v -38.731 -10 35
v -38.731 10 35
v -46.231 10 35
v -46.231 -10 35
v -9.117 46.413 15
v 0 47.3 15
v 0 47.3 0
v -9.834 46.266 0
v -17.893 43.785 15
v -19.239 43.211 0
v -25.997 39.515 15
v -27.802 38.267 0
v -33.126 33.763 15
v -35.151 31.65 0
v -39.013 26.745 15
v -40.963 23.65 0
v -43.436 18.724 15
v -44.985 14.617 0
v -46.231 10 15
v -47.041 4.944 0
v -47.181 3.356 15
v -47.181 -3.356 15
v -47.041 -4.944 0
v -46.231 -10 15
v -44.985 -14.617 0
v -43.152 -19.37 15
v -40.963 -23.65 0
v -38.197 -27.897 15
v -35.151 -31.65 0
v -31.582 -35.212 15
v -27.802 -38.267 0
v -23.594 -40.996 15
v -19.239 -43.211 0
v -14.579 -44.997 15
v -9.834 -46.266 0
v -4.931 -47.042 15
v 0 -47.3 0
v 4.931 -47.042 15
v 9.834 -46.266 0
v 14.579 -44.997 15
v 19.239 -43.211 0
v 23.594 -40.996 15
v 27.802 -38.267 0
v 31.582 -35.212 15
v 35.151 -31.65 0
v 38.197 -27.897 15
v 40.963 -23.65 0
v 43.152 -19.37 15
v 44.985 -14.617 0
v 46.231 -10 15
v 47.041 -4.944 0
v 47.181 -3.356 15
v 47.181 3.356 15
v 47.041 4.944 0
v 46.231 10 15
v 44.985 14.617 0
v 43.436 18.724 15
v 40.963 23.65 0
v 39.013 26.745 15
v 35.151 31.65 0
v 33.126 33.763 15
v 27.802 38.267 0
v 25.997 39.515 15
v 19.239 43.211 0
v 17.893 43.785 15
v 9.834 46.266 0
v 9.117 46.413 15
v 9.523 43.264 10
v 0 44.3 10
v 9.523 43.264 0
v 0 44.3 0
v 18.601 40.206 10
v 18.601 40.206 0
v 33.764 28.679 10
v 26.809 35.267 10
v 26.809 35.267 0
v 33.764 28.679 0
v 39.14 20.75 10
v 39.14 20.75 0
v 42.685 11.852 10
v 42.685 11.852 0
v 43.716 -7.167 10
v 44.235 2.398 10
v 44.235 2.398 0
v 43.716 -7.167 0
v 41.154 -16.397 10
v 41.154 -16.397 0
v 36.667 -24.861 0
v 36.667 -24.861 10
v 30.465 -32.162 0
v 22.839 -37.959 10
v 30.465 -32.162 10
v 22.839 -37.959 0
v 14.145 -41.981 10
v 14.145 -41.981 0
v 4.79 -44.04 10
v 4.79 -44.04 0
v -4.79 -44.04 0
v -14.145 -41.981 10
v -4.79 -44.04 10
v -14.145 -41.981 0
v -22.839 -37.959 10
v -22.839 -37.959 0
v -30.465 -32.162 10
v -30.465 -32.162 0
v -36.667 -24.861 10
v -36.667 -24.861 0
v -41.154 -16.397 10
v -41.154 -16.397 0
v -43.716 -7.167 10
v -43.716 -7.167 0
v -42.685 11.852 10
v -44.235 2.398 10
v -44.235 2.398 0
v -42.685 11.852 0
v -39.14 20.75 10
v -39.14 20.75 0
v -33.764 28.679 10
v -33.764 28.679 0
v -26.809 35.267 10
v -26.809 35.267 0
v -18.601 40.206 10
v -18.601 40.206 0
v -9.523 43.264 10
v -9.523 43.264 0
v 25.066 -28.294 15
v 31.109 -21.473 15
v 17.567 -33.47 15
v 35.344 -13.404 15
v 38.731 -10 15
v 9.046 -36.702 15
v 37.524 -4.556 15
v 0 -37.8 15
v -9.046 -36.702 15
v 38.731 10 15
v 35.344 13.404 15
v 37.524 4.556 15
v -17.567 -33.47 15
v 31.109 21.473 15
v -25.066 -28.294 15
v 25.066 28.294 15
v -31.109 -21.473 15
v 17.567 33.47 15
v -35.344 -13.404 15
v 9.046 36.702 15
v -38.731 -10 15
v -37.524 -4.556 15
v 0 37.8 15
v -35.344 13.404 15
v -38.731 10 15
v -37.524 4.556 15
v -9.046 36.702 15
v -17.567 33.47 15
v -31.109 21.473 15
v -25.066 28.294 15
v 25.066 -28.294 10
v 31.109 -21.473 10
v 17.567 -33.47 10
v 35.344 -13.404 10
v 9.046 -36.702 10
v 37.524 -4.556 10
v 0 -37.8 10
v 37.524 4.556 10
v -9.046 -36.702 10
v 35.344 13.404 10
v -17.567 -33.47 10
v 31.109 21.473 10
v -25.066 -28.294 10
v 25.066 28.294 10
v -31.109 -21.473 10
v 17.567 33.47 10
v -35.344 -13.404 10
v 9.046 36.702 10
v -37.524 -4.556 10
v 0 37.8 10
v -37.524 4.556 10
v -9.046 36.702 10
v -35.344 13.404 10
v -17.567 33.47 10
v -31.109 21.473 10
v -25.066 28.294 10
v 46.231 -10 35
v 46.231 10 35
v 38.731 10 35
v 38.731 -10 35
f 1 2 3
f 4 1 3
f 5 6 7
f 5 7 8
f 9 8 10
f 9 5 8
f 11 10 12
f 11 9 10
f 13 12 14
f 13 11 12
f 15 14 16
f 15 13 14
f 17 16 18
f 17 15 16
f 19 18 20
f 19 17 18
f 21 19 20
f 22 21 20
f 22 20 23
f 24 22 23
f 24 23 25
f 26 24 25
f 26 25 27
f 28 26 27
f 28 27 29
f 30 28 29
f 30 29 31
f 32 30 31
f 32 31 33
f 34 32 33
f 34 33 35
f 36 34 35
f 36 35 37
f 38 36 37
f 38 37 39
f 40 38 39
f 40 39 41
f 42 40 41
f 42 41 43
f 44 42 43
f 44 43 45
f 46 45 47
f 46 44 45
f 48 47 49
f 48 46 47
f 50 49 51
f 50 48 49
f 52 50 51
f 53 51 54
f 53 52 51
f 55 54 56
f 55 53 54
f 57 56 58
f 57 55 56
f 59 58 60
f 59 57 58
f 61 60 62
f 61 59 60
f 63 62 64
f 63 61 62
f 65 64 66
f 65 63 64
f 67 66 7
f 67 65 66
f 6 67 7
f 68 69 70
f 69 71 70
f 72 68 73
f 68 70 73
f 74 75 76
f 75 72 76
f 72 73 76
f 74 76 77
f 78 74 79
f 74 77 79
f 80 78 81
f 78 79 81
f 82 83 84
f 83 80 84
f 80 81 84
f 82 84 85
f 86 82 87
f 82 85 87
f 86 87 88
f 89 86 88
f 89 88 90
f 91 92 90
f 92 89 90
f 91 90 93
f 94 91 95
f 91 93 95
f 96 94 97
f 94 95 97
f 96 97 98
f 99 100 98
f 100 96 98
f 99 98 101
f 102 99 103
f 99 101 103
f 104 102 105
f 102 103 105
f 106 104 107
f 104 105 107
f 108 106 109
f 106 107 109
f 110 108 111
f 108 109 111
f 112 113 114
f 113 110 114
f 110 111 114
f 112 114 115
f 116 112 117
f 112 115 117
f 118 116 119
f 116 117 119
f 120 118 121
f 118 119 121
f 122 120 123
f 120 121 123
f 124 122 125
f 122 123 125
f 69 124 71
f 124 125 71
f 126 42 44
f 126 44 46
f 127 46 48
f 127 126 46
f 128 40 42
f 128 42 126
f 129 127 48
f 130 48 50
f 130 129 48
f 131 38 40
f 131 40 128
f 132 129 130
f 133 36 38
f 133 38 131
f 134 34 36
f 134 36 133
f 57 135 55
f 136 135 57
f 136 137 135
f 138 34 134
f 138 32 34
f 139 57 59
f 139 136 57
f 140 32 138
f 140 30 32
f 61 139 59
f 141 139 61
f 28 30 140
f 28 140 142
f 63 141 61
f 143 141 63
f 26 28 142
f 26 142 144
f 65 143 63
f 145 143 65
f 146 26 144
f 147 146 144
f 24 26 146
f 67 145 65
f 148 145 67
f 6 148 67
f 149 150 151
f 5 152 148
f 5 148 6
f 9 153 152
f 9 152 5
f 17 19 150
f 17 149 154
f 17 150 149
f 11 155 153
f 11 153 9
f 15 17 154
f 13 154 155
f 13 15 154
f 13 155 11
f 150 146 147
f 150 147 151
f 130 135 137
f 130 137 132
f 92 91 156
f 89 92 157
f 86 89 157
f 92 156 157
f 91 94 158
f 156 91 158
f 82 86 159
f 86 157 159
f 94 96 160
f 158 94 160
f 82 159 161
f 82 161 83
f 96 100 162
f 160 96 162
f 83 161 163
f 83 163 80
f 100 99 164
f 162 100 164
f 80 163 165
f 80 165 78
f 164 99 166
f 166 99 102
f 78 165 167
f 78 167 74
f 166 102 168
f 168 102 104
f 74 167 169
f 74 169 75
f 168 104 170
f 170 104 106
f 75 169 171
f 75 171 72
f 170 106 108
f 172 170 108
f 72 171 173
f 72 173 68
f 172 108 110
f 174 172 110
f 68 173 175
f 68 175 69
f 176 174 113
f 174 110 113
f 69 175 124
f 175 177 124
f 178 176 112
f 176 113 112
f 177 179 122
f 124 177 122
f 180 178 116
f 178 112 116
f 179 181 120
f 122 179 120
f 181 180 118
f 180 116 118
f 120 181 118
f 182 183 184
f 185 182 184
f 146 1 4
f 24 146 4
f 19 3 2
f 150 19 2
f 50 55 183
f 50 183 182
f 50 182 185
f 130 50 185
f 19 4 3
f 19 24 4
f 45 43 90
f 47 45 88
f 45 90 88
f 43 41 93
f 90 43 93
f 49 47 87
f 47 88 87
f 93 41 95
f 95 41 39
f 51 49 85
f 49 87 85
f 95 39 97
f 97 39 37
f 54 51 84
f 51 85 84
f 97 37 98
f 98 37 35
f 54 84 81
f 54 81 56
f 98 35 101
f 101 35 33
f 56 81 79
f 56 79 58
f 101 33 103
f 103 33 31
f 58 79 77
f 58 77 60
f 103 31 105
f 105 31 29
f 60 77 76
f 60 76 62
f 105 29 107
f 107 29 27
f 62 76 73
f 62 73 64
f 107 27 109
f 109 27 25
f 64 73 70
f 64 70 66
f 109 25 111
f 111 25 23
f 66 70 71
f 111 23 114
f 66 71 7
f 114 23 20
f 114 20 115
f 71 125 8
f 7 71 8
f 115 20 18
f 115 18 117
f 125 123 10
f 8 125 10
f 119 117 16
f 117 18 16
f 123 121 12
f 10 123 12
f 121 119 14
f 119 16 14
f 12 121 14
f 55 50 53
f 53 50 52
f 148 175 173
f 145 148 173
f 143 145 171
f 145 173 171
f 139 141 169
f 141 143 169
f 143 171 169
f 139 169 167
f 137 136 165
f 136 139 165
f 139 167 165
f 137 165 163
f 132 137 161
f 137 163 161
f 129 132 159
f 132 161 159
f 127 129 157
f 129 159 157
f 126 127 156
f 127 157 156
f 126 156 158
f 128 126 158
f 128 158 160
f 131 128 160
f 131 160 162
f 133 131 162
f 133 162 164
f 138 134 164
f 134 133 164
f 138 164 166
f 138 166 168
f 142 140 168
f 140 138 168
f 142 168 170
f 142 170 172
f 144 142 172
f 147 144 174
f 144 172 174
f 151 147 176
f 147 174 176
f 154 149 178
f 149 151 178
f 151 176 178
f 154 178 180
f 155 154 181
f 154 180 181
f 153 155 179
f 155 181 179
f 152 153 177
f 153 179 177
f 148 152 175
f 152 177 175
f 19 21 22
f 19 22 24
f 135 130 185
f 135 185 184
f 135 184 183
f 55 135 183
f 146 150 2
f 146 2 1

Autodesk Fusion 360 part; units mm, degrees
sketch "Sketch1" plane through (0, 0, 0) normal (1, 0, 0) x (0, 1, 0)
  line L0 (44.3, 0) -> (47.3, 0)
  line L1 (47.3, 0) -> (47.3, 15)
  line L2 (47.3, 15) -> (37.8, 15)
  line L3 (37.8, 15) -> (37.8, 10)
  line L4 (37.8, 10) -> (44.3, 10)
  line L5 (44.3, 10) -> (44.3, 0)
  dimension "d1" = 3
  dimension "d2" = 6.5
  dimension "d3" = 44.3
  dimension "d4" = 10
  dimension "d5" = 5
revolve "Revolve1" add sketch "Sketch1" angle 360 about axis through (0, 0, 1.75) along (0, 0, 1)
sketch "Sketch2" plane through (0, 0, 15) normal (0, 0, 1) x (-1, 0, 0)
  circle A0 centre (0, 0) radius 37.8
  circle A1 centre (0, 0) radius 47.3
  line L0 (46.2308, -10) -> (38.7308, -10)
  line L1 (38.7308, -10) -> (38.7308, 10)
  line L2 (38.7308, 10) -> (46.2308, 10)
  line L3 (46.2308, 10) -> (46.2308, -10)
  line L4 (-38.7308, -10) -> (-46.2308, -10)
  line L5 (-46.2308, -10) -> (-46.2308, 10)
  line L6 (-46.2308, 10) -> (-38.7308, 10)
  line L7 (-38.7308, 10) -> (-38.7308, -10)
  dimension "d7" = 7.5
  dimension "d8" = 20
extrude "Extrude1" add sketch "Sketch2" along normal blind 20 contours L0 L1 L2 L3 | L4 L5 L6 L7
sketch "Sketch3" plane through (46.2308, 0, 0) normal (1, 0, 0) x (0, 1, 0)
  line L0 (-10, 15) -> (10, 15)
  line L1 (10, 15) -> (10, 35)
  line L2 (10, 35) -> (-10, 35)
  line L3 (-10, 35) -> (-10, 15)
  circle A0 centre (0, 25) radius 10
  circle A1 centre (0, 25) radius 3.5
  dimension "d11" = 7
extrude "Extrude2" cut sketch "Sketch3" along normal through all contours L2 L3 A0 | L1 L2 A0 | A1
